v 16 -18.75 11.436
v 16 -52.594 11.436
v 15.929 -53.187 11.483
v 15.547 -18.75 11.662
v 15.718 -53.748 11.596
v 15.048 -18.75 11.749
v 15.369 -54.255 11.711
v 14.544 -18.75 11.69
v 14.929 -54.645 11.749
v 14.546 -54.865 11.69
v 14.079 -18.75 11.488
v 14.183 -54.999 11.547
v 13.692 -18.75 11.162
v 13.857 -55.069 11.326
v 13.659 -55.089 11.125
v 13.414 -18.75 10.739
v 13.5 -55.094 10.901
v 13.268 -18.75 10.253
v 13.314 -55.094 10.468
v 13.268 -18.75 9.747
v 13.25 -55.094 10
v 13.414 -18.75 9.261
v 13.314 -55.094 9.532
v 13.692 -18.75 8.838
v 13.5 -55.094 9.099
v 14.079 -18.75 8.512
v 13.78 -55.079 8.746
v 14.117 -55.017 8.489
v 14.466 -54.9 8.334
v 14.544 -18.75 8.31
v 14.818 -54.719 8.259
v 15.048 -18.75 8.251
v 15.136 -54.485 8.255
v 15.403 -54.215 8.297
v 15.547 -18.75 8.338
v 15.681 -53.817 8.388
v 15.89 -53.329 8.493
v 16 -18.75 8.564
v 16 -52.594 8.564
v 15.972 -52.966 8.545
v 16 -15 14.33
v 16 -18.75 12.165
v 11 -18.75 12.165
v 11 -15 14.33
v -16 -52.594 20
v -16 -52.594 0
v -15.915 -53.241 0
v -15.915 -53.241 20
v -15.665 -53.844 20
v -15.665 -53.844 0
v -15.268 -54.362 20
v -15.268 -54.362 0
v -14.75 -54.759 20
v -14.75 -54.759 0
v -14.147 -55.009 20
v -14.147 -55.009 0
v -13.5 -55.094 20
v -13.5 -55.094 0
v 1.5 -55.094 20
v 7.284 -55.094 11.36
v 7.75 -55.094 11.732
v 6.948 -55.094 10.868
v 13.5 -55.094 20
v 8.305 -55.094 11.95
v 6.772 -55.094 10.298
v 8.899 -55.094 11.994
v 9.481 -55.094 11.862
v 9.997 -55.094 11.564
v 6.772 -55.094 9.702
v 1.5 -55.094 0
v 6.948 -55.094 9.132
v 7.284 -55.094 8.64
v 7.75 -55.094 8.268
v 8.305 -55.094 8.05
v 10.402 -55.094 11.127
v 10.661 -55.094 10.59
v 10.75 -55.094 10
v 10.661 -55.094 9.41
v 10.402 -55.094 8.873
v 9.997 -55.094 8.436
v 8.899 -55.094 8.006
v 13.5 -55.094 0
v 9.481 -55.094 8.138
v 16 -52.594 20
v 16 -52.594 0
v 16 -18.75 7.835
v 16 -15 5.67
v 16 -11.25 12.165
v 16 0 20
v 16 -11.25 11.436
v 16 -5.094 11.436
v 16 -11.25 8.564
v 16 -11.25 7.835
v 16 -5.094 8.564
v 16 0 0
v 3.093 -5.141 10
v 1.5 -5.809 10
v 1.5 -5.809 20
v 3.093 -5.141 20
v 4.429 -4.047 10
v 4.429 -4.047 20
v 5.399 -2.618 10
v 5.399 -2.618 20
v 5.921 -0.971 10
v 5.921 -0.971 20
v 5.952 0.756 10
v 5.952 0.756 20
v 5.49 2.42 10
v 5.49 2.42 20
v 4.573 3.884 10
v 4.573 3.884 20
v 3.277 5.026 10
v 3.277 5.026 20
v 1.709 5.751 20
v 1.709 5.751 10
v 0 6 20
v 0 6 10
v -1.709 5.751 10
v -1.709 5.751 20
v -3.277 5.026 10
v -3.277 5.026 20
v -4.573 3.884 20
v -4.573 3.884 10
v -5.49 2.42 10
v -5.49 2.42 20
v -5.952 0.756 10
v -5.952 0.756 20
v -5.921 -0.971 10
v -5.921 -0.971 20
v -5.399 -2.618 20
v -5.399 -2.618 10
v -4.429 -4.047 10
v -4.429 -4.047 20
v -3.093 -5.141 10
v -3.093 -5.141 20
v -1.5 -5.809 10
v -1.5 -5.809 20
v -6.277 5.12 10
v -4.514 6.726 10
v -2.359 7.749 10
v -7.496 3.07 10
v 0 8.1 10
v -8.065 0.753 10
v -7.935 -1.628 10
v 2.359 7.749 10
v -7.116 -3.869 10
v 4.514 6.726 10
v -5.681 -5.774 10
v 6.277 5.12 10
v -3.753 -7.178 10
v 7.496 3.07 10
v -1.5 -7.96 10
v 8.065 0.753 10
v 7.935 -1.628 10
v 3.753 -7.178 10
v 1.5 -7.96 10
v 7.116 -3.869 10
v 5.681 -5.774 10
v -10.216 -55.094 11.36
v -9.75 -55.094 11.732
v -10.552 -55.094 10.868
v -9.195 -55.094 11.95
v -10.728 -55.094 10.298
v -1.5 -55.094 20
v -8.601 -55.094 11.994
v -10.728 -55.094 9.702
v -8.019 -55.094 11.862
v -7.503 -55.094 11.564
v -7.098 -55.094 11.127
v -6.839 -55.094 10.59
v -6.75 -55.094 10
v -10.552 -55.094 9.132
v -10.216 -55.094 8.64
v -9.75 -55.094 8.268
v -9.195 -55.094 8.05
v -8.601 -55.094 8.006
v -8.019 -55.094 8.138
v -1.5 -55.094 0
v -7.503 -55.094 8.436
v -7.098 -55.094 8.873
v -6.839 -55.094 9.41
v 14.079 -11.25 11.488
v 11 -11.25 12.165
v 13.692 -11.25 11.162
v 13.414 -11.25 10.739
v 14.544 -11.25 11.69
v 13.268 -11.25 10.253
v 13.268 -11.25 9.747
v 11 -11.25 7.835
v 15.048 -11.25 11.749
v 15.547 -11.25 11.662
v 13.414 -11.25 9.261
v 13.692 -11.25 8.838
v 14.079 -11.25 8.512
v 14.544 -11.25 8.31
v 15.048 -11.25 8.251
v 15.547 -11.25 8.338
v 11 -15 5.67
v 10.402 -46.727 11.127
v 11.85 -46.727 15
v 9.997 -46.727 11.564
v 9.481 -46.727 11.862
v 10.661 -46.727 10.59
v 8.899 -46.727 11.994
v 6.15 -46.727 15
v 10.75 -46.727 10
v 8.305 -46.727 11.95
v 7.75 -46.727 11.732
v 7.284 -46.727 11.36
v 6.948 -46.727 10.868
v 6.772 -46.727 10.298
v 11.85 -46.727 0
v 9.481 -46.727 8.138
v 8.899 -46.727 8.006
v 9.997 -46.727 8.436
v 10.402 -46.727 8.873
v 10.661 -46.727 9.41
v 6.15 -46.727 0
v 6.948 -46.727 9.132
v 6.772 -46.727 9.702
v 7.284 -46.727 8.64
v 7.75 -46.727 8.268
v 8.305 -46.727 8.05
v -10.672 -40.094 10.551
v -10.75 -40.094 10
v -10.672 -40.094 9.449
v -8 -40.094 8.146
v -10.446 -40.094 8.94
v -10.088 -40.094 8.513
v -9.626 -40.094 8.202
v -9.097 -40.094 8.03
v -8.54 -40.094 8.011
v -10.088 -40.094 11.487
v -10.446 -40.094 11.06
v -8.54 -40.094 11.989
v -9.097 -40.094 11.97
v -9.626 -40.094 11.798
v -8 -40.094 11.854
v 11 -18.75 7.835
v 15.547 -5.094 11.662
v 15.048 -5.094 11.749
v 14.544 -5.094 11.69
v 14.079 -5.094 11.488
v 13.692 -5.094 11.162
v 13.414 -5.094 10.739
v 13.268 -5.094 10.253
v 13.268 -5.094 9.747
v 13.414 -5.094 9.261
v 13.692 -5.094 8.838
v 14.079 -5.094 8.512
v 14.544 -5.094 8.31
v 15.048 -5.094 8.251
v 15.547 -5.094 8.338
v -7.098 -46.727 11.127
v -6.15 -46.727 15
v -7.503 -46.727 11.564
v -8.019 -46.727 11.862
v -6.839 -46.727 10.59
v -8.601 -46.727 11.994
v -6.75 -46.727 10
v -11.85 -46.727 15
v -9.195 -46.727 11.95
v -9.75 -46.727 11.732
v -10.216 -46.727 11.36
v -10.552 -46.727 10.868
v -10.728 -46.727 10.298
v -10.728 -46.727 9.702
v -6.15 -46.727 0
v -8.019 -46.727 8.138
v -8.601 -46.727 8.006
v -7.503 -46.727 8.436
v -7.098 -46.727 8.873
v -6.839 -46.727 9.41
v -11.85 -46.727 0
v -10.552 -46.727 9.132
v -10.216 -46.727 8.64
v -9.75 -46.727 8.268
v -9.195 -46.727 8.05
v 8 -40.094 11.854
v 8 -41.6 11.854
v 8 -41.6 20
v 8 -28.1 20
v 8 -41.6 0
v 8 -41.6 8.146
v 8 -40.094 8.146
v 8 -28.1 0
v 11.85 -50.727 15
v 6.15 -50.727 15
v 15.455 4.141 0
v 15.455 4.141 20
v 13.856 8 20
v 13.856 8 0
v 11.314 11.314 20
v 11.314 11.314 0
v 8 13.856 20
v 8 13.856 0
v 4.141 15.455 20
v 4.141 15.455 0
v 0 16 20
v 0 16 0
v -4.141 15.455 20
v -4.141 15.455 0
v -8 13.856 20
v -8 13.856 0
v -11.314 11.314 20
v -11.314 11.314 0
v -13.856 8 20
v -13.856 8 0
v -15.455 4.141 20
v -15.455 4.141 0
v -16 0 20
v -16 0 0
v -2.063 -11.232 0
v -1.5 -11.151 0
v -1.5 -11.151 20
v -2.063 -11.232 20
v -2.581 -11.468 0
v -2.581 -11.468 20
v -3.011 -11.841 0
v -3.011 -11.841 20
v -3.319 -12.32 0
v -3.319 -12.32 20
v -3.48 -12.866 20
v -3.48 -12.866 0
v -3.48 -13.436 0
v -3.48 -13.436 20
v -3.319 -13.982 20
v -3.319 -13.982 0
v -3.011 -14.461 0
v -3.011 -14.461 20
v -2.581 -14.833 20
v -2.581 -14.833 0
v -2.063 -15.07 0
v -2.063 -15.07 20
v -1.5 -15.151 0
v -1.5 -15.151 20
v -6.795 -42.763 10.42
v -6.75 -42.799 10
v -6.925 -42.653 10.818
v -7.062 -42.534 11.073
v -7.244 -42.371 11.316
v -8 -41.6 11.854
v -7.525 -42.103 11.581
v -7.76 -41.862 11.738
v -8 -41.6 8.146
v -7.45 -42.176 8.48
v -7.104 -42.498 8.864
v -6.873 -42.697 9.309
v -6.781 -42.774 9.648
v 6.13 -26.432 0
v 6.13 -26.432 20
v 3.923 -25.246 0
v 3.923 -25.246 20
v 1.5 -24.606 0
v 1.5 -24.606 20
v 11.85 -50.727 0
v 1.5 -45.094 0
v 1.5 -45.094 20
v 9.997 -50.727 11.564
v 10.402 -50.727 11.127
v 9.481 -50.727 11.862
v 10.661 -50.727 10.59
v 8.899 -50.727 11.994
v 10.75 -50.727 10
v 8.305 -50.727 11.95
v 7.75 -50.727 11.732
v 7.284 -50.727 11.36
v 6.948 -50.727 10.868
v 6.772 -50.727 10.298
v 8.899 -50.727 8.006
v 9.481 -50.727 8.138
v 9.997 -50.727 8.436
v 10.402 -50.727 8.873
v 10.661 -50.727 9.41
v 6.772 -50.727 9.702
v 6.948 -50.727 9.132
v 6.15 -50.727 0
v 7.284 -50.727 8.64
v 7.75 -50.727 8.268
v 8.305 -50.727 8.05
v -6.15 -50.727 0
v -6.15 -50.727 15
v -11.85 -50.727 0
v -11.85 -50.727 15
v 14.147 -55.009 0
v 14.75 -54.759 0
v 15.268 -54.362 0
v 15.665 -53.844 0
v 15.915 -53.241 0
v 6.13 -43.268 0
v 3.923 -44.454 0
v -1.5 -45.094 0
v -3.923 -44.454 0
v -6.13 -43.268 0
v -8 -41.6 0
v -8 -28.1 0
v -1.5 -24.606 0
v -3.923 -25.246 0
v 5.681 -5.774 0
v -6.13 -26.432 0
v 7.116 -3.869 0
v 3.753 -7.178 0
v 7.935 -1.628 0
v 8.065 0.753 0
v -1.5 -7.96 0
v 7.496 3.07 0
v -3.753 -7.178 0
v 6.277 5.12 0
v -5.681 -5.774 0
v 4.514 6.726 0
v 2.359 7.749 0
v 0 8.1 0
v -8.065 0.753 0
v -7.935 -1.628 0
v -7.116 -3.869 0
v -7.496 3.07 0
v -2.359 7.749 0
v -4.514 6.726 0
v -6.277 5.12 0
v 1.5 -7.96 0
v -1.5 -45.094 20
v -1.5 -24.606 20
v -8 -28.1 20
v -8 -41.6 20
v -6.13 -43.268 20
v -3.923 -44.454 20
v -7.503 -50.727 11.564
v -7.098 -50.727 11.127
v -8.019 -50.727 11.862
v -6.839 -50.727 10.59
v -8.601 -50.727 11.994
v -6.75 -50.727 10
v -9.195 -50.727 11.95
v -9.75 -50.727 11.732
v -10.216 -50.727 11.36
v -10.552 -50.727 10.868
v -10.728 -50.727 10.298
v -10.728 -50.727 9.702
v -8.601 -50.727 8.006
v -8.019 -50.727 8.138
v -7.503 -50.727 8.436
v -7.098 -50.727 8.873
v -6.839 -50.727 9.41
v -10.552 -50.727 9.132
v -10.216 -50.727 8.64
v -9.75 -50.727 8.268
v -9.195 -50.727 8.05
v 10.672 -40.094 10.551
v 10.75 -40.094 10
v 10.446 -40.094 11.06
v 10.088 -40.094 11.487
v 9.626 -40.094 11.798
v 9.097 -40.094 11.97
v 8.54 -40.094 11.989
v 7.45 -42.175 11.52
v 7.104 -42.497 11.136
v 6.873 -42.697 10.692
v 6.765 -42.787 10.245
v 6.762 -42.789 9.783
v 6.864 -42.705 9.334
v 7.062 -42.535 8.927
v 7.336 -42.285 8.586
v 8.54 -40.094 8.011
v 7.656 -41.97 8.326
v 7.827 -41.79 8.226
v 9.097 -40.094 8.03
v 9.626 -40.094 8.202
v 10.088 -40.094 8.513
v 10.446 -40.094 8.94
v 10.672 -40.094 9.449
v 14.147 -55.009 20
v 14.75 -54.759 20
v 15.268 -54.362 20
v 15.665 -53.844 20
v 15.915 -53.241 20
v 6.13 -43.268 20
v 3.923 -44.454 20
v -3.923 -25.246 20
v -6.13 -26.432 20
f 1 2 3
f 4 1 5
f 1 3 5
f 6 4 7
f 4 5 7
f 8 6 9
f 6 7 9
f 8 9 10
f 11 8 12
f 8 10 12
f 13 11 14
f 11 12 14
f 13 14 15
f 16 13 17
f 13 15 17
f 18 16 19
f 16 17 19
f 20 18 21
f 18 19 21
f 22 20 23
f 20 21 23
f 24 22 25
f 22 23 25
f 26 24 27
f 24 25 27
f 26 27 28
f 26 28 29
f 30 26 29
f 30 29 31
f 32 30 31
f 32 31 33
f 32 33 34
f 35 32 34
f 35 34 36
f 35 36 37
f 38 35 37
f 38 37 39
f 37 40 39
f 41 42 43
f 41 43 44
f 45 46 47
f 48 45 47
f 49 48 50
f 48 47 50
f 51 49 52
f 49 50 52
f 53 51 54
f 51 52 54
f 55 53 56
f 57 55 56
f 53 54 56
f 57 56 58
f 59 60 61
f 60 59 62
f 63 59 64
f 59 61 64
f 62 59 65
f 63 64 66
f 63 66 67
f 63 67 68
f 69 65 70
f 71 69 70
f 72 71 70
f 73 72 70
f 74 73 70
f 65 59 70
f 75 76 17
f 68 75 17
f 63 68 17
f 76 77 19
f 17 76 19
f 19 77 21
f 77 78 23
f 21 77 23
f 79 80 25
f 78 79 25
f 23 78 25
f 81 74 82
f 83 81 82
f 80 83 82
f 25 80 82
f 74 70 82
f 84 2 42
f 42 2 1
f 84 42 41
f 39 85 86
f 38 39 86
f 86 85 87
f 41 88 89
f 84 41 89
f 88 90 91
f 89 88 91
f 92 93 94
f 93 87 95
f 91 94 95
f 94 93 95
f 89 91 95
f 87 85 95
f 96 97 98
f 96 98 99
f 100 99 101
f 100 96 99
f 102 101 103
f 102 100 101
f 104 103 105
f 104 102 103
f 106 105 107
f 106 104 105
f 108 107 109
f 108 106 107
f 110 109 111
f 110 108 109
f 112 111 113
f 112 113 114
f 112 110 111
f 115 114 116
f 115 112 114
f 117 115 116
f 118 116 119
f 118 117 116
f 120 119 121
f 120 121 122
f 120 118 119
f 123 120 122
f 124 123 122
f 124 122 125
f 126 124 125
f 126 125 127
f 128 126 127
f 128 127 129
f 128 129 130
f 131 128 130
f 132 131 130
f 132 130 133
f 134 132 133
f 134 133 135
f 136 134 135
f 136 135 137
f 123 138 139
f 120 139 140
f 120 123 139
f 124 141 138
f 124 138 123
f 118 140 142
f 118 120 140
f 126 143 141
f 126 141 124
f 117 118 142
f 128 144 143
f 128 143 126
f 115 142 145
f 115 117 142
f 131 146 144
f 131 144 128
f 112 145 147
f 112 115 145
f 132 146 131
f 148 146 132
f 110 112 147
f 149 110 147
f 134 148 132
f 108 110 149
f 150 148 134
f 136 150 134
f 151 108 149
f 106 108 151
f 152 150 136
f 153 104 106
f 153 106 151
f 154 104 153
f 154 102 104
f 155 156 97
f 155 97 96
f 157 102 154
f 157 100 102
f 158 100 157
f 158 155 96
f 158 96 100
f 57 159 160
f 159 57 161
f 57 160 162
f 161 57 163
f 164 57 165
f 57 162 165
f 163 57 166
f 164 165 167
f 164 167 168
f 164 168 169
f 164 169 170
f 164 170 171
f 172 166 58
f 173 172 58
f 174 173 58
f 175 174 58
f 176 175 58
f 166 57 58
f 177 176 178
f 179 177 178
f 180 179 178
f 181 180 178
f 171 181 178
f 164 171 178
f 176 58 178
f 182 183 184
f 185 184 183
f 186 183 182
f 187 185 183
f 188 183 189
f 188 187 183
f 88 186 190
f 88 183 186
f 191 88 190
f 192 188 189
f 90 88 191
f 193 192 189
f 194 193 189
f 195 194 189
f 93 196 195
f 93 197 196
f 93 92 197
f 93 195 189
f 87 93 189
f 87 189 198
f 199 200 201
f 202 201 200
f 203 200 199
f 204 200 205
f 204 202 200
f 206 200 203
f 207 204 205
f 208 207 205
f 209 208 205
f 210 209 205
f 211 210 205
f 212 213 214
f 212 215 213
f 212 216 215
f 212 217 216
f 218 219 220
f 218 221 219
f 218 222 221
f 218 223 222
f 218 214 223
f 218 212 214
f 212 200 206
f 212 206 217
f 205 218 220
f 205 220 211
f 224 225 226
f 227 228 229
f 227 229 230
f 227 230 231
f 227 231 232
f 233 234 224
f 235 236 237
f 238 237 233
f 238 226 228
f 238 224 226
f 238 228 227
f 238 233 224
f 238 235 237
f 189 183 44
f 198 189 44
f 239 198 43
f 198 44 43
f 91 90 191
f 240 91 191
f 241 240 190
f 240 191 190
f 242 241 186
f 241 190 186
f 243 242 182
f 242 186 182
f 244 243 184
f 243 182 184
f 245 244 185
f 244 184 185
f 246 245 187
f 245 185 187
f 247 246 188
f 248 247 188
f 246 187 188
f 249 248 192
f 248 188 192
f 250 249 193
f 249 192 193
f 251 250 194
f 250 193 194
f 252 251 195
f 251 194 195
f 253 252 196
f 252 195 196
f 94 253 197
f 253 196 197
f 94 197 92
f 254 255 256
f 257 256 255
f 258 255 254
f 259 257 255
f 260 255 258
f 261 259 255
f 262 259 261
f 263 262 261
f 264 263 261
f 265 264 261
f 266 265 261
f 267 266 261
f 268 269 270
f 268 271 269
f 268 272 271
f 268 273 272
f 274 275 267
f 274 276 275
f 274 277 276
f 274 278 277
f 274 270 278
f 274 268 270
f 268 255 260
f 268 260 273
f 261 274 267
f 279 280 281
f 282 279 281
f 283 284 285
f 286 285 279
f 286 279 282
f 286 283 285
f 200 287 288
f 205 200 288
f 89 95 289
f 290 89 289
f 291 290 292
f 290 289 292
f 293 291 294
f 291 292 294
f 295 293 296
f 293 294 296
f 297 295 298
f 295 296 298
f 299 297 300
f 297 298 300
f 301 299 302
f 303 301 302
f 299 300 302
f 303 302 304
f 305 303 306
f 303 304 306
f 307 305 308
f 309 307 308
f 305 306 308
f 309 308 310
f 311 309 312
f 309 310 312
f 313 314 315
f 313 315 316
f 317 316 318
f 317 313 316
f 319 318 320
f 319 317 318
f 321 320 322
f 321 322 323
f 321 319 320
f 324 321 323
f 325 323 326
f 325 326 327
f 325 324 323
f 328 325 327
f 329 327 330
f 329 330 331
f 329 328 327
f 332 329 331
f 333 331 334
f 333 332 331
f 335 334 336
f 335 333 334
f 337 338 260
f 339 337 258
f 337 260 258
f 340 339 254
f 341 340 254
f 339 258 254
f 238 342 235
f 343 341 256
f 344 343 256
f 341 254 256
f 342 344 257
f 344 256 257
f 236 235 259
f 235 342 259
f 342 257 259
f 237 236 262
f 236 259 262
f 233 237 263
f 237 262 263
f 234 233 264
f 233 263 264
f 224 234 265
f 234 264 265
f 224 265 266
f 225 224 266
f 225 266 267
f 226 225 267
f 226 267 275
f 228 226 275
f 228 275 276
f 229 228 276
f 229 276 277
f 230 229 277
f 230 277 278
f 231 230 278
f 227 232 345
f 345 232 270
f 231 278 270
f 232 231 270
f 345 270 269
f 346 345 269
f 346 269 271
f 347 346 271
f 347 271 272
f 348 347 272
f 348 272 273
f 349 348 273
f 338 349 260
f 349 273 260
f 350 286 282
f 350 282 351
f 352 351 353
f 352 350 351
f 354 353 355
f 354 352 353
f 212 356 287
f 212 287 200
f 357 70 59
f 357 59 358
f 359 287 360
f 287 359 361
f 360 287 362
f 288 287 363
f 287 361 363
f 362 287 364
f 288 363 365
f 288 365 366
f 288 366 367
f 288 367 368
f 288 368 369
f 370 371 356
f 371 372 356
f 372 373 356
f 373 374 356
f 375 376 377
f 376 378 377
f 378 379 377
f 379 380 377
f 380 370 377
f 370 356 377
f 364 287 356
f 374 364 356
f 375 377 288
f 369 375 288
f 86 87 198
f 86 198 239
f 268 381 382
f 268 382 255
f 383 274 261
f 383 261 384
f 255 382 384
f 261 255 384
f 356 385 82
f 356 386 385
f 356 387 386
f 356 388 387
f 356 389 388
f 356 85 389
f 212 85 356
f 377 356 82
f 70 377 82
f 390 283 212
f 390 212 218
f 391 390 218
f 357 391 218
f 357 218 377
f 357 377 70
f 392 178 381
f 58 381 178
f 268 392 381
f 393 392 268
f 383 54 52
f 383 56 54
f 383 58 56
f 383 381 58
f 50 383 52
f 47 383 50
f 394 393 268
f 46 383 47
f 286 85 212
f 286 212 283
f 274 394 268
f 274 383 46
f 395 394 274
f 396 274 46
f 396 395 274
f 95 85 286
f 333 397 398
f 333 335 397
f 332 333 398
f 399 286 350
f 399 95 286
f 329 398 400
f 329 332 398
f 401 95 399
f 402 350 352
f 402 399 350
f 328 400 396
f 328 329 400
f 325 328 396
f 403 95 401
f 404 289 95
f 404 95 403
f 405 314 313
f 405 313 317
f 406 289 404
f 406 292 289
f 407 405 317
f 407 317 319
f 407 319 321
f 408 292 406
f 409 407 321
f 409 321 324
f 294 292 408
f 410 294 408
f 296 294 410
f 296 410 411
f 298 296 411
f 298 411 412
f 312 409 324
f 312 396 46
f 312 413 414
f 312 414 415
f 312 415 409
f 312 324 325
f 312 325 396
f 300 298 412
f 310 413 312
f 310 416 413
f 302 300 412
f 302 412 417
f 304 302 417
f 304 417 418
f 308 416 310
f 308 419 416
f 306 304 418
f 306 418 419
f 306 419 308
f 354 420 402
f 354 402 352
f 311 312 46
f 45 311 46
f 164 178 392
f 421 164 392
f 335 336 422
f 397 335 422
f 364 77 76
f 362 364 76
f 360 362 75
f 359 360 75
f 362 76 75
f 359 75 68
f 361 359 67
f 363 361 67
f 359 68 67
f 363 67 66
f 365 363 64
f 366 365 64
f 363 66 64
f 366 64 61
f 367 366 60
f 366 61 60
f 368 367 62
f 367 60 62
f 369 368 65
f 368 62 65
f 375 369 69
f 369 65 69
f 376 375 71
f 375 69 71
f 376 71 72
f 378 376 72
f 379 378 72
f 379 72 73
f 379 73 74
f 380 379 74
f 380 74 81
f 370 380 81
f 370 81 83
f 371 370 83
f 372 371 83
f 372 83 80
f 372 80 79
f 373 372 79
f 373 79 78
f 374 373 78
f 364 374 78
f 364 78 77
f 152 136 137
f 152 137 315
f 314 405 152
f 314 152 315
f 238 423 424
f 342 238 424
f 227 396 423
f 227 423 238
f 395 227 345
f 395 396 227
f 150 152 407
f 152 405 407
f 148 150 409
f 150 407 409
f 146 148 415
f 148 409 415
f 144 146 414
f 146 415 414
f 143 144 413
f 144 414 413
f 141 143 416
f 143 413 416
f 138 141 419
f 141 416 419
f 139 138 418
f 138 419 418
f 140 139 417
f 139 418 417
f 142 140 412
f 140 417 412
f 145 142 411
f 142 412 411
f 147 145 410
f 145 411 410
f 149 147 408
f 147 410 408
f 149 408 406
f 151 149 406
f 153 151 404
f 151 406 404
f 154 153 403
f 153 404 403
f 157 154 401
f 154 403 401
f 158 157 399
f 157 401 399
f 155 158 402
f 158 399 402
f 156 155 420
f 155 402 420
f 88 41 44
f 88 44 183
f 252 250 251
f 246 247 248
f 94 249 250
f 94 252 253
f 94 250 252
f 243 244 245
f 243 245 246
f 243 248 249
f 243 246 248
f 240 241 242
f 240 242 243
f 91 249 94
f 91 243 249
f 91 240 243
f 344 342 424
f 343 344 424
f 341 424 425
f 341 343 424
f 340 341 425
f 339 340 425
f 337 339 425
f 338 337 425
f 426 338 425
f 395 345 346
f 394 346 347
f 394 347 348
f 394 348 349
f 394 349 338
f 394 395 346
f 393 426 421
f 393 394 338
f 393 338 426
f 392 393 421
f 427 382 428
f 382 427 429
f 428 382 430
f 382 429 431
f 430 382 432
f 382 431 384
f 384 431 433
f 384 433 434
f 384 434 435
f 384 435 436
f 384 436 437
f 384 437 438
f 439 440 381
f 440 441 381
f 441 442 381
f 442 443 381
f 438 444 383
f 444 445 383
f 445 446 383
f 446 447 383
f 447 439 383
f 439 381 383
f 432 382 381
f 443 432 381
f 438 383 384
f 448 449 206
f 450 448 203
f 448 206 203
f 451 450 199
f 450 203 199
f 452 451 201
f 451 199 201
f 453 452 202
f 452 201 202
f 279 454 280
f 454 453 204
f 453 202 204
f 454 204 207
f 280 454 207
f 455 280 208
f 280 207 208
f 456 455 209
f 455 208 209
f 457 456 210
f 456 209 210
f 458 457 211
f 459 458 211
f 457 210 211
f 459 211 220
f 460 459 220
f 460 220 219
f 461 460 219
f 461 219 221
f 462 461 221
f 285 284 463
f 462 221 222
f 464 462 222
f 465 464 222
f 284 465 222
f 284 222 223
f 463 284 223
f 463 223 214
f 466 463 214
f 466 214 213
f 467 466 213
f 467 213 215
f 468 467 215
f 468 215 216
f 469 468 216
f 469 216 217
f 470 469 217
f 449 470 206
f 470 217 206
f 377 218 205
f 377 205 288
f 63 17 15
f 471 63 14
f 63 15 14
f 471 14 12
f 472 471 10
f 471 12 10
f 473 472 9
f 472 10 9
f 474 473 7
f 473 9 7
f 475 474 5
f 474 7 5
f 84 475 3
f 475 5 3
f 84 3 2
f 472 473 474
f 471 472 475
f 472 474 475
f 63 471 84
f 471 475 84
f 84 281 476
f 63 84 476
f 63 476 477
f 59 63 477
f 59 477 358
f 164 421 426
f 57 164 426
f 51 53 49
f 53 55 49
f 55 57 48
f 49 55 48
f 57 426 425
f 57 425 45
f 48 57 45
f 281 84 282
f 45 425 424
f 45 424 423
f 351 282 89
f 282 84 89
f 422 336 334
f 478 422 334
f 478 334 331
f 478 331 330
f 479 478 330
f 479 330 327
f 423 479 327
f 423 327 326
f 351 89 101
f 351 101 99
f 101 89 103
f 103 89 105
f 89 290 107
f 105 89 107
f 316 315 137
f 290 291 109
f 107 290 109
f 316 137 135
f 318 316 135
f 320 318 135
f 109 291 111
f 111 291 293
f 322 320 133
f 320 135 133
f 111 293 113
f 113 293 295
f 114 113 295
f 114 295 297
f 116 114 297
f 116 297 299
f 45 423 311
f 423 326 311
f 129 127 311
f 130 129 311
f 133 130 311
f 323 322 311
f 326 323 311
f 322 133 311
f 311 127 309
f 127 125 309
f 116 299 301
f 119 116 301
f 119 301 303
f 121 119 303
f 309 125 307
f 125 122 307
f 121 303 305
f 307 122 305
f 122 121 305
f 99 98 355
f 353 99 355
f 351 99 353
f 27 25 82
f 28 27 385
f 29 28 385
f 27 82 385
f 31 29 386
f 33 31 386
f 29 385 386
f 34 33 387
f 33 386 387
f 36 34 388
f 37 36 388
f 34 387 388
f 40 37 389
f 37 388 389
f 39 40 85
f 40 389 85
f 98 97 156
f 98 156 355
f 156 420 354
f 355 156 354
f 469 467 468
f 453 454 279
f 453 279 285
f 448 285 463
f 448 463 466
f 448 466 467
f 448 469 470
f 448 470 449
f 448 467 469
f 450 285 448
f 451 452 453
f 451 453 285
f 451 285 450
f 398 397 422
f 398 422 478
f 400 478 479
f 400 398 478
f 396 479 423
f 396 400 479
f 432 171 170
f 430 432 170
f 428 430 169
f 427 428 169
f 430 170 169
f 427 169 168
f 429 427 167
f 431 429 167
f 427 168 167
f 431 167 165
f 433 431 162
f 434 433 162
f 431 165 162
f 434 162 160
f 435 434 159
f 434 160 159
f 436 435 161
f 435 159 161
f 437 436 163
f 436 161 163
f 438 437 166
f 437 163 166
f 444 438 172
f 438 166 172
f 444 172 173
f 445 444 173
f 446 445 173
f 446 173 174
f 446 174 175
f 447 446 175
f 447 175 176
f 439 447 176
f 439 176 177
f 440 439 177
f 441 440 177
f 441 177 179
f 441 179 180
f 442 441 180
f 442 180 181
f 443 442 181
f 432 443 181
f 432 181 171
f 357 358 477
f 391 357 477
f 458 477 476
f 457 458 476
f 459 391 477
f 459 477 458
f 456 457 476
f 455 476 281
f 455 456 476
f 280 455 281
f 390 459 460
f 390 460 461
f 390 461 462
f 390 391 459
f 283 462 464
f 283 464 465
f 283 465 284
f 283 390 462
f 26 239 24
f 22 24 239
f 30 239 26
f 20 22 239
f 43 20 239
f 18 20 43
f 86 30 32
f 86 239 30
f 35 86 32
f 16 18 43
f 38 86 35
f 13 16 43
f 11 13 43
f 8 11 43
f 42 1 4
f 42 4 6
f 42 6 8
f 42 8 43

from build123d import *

# Parameters (mm, degrees)
PAD001_DEPTH    = 20
SKETCH012_R     = 1.75
POCKET008_DEPTH = 50
POCKET009_DEPTH = 5
POCKET010_DEPTH = 15
SKETCH015_R     = 2
POCKET011_DEPTH = 15
SKETCH016_R     = 8.1
POCKET012_DEPTH = 10


with BuildPart() as part:
    # Sketch011 → Pad001 (new body)
    with BuildSketch(Plane.XY):
        with BuildLine():
            Line((-8, -28.1), (-8, -41.6))
            ThreePointArc((-8, -41.6), (-5.061117, -43.925857), (-1.5, -45.094227))
            Line((-1.5, -55.094227), (-1.5, -45.094227))
            Line((-13.5, -55.094227), (-1.5, -55.094227))
            ThreePointArc((-16, -52.594227), (-15.267767, -54.361994), (-13.5, -55.094227))
            Line((-16, 0), (-16, -52.594227))
            ThreePointArc((16, 0), (0, 16), (-16, 0))
            Line((16, -52.594227), (16, 0))
            ThreePointArc((13.5, -55.094227), (15.267767, -54.361994), (16, -52.594227))
            Line((1.5, -55.094227), (13.5, -55.094227))
            Line((1.5, -55.094227), (1.5, -45.094227))
            ThreePointArc((1.5, -45.094227), (5.061117, -43.925857), (8, -41.6))
            Line((8, -41.6), (8, -28.1))
            ThreePointArc((8, -28.1), (5.061117, -25.774143), (1.5, -24.605773))
            Line((1.5, -5.809475), (1.5, -24.605773))
            ThreePointArc((1.5, -5.809475), (0, 6), (-1.5, -5.809475))
            Line((-1.5, -5.809475), (-1.5, -11.150936))
            ThreePointArc((-1.5, -11.150936), (-3.5, -13.150936), (-1.5, -15.150936))
            Line((-1.5, -15.150936), (-1.5, -24.605773))
            ThreePointArc((-1.5, -24.605773), (-5.061117, -25.774143), (-8, -28.1))
        make_face()
    extrude(amount=PAD001_DEPTH)

    # Sketch012 (on Face9 of Pad001) → Pocket008 (cut)
    with BuildSketch(Plane.XZ.offset(55.094227)):
        with Locations((15, 10)):
            Circle(SKETCH012_R)
    extrude(amount=-POCKET008_DEPTH, mode=Mode.SUBTRACT)

    # Sketch013 (on Face17 of Pocket008) → Pocket009 (cut)
    with BuildSketch(Plane(origin=(16, 0, 0), x_dir=(0, -1, 0), z_dir=(-1, 0, 0))):
        Polygon((18.75, 7.834936), (18.75, 12.165064), (15, 14.330127), (11.25, 12.165064), (11.25, 7.834936), (15, 5.669873), align=None)
    extrude(amount=POCKET009_DEPTH, mode=Mode.SUBTRACT)

    # Sketch014 → Pocket010 (cut)
    with BuildSketch(Plane(origin=(0, 0, 0), x_dir=(1, 0, 0), z_dir=(0, 0, -1))):
        Polygon((-7, 50.72662), (-6.15, 50.72662), (-6.15, 46.72662), (-11.85, 46.72662), (-11.85, 50.72662), (-11, 50.72662), align=None)
        Polygon((11, 50.72662), (11.85, 50.72662), (11.85, 46.72662), (6.15, 46.72662), (6.15, 50.72662), (7, 50.72662), align=None)
    extrude(amount=-POCKET010_DEPTH, mode=Mode.SUBTRACT)

    # Sketch015 (on Face19 of Pocket010) → Pocket011 (cut)
    with BuildSketch(Plane.XZ.offset(55.094227)):
        with Locations((-8.75, 10)):
            Circle(SKETCH015_R)
        with Locations((8.75, 10)):
            Circle(SKETCH015_R)
    extrude(amount=-POCKET011_DEPTH, mode=Mode.SUBTRACT)

    # Sketch016 (on Face4 of Pocket011) → Pocket012 (cut)
    with BuildSketch(Plane(origin=(0, 0, 0), x_dir=(1, 0, 0), z_dir=(0, 0, -1))):
        Circle(SKETCH016_R)
    extrude(amount=-POCKET012_DEPTH, mode=Mode.SUBTRACT)


solid = part.part
